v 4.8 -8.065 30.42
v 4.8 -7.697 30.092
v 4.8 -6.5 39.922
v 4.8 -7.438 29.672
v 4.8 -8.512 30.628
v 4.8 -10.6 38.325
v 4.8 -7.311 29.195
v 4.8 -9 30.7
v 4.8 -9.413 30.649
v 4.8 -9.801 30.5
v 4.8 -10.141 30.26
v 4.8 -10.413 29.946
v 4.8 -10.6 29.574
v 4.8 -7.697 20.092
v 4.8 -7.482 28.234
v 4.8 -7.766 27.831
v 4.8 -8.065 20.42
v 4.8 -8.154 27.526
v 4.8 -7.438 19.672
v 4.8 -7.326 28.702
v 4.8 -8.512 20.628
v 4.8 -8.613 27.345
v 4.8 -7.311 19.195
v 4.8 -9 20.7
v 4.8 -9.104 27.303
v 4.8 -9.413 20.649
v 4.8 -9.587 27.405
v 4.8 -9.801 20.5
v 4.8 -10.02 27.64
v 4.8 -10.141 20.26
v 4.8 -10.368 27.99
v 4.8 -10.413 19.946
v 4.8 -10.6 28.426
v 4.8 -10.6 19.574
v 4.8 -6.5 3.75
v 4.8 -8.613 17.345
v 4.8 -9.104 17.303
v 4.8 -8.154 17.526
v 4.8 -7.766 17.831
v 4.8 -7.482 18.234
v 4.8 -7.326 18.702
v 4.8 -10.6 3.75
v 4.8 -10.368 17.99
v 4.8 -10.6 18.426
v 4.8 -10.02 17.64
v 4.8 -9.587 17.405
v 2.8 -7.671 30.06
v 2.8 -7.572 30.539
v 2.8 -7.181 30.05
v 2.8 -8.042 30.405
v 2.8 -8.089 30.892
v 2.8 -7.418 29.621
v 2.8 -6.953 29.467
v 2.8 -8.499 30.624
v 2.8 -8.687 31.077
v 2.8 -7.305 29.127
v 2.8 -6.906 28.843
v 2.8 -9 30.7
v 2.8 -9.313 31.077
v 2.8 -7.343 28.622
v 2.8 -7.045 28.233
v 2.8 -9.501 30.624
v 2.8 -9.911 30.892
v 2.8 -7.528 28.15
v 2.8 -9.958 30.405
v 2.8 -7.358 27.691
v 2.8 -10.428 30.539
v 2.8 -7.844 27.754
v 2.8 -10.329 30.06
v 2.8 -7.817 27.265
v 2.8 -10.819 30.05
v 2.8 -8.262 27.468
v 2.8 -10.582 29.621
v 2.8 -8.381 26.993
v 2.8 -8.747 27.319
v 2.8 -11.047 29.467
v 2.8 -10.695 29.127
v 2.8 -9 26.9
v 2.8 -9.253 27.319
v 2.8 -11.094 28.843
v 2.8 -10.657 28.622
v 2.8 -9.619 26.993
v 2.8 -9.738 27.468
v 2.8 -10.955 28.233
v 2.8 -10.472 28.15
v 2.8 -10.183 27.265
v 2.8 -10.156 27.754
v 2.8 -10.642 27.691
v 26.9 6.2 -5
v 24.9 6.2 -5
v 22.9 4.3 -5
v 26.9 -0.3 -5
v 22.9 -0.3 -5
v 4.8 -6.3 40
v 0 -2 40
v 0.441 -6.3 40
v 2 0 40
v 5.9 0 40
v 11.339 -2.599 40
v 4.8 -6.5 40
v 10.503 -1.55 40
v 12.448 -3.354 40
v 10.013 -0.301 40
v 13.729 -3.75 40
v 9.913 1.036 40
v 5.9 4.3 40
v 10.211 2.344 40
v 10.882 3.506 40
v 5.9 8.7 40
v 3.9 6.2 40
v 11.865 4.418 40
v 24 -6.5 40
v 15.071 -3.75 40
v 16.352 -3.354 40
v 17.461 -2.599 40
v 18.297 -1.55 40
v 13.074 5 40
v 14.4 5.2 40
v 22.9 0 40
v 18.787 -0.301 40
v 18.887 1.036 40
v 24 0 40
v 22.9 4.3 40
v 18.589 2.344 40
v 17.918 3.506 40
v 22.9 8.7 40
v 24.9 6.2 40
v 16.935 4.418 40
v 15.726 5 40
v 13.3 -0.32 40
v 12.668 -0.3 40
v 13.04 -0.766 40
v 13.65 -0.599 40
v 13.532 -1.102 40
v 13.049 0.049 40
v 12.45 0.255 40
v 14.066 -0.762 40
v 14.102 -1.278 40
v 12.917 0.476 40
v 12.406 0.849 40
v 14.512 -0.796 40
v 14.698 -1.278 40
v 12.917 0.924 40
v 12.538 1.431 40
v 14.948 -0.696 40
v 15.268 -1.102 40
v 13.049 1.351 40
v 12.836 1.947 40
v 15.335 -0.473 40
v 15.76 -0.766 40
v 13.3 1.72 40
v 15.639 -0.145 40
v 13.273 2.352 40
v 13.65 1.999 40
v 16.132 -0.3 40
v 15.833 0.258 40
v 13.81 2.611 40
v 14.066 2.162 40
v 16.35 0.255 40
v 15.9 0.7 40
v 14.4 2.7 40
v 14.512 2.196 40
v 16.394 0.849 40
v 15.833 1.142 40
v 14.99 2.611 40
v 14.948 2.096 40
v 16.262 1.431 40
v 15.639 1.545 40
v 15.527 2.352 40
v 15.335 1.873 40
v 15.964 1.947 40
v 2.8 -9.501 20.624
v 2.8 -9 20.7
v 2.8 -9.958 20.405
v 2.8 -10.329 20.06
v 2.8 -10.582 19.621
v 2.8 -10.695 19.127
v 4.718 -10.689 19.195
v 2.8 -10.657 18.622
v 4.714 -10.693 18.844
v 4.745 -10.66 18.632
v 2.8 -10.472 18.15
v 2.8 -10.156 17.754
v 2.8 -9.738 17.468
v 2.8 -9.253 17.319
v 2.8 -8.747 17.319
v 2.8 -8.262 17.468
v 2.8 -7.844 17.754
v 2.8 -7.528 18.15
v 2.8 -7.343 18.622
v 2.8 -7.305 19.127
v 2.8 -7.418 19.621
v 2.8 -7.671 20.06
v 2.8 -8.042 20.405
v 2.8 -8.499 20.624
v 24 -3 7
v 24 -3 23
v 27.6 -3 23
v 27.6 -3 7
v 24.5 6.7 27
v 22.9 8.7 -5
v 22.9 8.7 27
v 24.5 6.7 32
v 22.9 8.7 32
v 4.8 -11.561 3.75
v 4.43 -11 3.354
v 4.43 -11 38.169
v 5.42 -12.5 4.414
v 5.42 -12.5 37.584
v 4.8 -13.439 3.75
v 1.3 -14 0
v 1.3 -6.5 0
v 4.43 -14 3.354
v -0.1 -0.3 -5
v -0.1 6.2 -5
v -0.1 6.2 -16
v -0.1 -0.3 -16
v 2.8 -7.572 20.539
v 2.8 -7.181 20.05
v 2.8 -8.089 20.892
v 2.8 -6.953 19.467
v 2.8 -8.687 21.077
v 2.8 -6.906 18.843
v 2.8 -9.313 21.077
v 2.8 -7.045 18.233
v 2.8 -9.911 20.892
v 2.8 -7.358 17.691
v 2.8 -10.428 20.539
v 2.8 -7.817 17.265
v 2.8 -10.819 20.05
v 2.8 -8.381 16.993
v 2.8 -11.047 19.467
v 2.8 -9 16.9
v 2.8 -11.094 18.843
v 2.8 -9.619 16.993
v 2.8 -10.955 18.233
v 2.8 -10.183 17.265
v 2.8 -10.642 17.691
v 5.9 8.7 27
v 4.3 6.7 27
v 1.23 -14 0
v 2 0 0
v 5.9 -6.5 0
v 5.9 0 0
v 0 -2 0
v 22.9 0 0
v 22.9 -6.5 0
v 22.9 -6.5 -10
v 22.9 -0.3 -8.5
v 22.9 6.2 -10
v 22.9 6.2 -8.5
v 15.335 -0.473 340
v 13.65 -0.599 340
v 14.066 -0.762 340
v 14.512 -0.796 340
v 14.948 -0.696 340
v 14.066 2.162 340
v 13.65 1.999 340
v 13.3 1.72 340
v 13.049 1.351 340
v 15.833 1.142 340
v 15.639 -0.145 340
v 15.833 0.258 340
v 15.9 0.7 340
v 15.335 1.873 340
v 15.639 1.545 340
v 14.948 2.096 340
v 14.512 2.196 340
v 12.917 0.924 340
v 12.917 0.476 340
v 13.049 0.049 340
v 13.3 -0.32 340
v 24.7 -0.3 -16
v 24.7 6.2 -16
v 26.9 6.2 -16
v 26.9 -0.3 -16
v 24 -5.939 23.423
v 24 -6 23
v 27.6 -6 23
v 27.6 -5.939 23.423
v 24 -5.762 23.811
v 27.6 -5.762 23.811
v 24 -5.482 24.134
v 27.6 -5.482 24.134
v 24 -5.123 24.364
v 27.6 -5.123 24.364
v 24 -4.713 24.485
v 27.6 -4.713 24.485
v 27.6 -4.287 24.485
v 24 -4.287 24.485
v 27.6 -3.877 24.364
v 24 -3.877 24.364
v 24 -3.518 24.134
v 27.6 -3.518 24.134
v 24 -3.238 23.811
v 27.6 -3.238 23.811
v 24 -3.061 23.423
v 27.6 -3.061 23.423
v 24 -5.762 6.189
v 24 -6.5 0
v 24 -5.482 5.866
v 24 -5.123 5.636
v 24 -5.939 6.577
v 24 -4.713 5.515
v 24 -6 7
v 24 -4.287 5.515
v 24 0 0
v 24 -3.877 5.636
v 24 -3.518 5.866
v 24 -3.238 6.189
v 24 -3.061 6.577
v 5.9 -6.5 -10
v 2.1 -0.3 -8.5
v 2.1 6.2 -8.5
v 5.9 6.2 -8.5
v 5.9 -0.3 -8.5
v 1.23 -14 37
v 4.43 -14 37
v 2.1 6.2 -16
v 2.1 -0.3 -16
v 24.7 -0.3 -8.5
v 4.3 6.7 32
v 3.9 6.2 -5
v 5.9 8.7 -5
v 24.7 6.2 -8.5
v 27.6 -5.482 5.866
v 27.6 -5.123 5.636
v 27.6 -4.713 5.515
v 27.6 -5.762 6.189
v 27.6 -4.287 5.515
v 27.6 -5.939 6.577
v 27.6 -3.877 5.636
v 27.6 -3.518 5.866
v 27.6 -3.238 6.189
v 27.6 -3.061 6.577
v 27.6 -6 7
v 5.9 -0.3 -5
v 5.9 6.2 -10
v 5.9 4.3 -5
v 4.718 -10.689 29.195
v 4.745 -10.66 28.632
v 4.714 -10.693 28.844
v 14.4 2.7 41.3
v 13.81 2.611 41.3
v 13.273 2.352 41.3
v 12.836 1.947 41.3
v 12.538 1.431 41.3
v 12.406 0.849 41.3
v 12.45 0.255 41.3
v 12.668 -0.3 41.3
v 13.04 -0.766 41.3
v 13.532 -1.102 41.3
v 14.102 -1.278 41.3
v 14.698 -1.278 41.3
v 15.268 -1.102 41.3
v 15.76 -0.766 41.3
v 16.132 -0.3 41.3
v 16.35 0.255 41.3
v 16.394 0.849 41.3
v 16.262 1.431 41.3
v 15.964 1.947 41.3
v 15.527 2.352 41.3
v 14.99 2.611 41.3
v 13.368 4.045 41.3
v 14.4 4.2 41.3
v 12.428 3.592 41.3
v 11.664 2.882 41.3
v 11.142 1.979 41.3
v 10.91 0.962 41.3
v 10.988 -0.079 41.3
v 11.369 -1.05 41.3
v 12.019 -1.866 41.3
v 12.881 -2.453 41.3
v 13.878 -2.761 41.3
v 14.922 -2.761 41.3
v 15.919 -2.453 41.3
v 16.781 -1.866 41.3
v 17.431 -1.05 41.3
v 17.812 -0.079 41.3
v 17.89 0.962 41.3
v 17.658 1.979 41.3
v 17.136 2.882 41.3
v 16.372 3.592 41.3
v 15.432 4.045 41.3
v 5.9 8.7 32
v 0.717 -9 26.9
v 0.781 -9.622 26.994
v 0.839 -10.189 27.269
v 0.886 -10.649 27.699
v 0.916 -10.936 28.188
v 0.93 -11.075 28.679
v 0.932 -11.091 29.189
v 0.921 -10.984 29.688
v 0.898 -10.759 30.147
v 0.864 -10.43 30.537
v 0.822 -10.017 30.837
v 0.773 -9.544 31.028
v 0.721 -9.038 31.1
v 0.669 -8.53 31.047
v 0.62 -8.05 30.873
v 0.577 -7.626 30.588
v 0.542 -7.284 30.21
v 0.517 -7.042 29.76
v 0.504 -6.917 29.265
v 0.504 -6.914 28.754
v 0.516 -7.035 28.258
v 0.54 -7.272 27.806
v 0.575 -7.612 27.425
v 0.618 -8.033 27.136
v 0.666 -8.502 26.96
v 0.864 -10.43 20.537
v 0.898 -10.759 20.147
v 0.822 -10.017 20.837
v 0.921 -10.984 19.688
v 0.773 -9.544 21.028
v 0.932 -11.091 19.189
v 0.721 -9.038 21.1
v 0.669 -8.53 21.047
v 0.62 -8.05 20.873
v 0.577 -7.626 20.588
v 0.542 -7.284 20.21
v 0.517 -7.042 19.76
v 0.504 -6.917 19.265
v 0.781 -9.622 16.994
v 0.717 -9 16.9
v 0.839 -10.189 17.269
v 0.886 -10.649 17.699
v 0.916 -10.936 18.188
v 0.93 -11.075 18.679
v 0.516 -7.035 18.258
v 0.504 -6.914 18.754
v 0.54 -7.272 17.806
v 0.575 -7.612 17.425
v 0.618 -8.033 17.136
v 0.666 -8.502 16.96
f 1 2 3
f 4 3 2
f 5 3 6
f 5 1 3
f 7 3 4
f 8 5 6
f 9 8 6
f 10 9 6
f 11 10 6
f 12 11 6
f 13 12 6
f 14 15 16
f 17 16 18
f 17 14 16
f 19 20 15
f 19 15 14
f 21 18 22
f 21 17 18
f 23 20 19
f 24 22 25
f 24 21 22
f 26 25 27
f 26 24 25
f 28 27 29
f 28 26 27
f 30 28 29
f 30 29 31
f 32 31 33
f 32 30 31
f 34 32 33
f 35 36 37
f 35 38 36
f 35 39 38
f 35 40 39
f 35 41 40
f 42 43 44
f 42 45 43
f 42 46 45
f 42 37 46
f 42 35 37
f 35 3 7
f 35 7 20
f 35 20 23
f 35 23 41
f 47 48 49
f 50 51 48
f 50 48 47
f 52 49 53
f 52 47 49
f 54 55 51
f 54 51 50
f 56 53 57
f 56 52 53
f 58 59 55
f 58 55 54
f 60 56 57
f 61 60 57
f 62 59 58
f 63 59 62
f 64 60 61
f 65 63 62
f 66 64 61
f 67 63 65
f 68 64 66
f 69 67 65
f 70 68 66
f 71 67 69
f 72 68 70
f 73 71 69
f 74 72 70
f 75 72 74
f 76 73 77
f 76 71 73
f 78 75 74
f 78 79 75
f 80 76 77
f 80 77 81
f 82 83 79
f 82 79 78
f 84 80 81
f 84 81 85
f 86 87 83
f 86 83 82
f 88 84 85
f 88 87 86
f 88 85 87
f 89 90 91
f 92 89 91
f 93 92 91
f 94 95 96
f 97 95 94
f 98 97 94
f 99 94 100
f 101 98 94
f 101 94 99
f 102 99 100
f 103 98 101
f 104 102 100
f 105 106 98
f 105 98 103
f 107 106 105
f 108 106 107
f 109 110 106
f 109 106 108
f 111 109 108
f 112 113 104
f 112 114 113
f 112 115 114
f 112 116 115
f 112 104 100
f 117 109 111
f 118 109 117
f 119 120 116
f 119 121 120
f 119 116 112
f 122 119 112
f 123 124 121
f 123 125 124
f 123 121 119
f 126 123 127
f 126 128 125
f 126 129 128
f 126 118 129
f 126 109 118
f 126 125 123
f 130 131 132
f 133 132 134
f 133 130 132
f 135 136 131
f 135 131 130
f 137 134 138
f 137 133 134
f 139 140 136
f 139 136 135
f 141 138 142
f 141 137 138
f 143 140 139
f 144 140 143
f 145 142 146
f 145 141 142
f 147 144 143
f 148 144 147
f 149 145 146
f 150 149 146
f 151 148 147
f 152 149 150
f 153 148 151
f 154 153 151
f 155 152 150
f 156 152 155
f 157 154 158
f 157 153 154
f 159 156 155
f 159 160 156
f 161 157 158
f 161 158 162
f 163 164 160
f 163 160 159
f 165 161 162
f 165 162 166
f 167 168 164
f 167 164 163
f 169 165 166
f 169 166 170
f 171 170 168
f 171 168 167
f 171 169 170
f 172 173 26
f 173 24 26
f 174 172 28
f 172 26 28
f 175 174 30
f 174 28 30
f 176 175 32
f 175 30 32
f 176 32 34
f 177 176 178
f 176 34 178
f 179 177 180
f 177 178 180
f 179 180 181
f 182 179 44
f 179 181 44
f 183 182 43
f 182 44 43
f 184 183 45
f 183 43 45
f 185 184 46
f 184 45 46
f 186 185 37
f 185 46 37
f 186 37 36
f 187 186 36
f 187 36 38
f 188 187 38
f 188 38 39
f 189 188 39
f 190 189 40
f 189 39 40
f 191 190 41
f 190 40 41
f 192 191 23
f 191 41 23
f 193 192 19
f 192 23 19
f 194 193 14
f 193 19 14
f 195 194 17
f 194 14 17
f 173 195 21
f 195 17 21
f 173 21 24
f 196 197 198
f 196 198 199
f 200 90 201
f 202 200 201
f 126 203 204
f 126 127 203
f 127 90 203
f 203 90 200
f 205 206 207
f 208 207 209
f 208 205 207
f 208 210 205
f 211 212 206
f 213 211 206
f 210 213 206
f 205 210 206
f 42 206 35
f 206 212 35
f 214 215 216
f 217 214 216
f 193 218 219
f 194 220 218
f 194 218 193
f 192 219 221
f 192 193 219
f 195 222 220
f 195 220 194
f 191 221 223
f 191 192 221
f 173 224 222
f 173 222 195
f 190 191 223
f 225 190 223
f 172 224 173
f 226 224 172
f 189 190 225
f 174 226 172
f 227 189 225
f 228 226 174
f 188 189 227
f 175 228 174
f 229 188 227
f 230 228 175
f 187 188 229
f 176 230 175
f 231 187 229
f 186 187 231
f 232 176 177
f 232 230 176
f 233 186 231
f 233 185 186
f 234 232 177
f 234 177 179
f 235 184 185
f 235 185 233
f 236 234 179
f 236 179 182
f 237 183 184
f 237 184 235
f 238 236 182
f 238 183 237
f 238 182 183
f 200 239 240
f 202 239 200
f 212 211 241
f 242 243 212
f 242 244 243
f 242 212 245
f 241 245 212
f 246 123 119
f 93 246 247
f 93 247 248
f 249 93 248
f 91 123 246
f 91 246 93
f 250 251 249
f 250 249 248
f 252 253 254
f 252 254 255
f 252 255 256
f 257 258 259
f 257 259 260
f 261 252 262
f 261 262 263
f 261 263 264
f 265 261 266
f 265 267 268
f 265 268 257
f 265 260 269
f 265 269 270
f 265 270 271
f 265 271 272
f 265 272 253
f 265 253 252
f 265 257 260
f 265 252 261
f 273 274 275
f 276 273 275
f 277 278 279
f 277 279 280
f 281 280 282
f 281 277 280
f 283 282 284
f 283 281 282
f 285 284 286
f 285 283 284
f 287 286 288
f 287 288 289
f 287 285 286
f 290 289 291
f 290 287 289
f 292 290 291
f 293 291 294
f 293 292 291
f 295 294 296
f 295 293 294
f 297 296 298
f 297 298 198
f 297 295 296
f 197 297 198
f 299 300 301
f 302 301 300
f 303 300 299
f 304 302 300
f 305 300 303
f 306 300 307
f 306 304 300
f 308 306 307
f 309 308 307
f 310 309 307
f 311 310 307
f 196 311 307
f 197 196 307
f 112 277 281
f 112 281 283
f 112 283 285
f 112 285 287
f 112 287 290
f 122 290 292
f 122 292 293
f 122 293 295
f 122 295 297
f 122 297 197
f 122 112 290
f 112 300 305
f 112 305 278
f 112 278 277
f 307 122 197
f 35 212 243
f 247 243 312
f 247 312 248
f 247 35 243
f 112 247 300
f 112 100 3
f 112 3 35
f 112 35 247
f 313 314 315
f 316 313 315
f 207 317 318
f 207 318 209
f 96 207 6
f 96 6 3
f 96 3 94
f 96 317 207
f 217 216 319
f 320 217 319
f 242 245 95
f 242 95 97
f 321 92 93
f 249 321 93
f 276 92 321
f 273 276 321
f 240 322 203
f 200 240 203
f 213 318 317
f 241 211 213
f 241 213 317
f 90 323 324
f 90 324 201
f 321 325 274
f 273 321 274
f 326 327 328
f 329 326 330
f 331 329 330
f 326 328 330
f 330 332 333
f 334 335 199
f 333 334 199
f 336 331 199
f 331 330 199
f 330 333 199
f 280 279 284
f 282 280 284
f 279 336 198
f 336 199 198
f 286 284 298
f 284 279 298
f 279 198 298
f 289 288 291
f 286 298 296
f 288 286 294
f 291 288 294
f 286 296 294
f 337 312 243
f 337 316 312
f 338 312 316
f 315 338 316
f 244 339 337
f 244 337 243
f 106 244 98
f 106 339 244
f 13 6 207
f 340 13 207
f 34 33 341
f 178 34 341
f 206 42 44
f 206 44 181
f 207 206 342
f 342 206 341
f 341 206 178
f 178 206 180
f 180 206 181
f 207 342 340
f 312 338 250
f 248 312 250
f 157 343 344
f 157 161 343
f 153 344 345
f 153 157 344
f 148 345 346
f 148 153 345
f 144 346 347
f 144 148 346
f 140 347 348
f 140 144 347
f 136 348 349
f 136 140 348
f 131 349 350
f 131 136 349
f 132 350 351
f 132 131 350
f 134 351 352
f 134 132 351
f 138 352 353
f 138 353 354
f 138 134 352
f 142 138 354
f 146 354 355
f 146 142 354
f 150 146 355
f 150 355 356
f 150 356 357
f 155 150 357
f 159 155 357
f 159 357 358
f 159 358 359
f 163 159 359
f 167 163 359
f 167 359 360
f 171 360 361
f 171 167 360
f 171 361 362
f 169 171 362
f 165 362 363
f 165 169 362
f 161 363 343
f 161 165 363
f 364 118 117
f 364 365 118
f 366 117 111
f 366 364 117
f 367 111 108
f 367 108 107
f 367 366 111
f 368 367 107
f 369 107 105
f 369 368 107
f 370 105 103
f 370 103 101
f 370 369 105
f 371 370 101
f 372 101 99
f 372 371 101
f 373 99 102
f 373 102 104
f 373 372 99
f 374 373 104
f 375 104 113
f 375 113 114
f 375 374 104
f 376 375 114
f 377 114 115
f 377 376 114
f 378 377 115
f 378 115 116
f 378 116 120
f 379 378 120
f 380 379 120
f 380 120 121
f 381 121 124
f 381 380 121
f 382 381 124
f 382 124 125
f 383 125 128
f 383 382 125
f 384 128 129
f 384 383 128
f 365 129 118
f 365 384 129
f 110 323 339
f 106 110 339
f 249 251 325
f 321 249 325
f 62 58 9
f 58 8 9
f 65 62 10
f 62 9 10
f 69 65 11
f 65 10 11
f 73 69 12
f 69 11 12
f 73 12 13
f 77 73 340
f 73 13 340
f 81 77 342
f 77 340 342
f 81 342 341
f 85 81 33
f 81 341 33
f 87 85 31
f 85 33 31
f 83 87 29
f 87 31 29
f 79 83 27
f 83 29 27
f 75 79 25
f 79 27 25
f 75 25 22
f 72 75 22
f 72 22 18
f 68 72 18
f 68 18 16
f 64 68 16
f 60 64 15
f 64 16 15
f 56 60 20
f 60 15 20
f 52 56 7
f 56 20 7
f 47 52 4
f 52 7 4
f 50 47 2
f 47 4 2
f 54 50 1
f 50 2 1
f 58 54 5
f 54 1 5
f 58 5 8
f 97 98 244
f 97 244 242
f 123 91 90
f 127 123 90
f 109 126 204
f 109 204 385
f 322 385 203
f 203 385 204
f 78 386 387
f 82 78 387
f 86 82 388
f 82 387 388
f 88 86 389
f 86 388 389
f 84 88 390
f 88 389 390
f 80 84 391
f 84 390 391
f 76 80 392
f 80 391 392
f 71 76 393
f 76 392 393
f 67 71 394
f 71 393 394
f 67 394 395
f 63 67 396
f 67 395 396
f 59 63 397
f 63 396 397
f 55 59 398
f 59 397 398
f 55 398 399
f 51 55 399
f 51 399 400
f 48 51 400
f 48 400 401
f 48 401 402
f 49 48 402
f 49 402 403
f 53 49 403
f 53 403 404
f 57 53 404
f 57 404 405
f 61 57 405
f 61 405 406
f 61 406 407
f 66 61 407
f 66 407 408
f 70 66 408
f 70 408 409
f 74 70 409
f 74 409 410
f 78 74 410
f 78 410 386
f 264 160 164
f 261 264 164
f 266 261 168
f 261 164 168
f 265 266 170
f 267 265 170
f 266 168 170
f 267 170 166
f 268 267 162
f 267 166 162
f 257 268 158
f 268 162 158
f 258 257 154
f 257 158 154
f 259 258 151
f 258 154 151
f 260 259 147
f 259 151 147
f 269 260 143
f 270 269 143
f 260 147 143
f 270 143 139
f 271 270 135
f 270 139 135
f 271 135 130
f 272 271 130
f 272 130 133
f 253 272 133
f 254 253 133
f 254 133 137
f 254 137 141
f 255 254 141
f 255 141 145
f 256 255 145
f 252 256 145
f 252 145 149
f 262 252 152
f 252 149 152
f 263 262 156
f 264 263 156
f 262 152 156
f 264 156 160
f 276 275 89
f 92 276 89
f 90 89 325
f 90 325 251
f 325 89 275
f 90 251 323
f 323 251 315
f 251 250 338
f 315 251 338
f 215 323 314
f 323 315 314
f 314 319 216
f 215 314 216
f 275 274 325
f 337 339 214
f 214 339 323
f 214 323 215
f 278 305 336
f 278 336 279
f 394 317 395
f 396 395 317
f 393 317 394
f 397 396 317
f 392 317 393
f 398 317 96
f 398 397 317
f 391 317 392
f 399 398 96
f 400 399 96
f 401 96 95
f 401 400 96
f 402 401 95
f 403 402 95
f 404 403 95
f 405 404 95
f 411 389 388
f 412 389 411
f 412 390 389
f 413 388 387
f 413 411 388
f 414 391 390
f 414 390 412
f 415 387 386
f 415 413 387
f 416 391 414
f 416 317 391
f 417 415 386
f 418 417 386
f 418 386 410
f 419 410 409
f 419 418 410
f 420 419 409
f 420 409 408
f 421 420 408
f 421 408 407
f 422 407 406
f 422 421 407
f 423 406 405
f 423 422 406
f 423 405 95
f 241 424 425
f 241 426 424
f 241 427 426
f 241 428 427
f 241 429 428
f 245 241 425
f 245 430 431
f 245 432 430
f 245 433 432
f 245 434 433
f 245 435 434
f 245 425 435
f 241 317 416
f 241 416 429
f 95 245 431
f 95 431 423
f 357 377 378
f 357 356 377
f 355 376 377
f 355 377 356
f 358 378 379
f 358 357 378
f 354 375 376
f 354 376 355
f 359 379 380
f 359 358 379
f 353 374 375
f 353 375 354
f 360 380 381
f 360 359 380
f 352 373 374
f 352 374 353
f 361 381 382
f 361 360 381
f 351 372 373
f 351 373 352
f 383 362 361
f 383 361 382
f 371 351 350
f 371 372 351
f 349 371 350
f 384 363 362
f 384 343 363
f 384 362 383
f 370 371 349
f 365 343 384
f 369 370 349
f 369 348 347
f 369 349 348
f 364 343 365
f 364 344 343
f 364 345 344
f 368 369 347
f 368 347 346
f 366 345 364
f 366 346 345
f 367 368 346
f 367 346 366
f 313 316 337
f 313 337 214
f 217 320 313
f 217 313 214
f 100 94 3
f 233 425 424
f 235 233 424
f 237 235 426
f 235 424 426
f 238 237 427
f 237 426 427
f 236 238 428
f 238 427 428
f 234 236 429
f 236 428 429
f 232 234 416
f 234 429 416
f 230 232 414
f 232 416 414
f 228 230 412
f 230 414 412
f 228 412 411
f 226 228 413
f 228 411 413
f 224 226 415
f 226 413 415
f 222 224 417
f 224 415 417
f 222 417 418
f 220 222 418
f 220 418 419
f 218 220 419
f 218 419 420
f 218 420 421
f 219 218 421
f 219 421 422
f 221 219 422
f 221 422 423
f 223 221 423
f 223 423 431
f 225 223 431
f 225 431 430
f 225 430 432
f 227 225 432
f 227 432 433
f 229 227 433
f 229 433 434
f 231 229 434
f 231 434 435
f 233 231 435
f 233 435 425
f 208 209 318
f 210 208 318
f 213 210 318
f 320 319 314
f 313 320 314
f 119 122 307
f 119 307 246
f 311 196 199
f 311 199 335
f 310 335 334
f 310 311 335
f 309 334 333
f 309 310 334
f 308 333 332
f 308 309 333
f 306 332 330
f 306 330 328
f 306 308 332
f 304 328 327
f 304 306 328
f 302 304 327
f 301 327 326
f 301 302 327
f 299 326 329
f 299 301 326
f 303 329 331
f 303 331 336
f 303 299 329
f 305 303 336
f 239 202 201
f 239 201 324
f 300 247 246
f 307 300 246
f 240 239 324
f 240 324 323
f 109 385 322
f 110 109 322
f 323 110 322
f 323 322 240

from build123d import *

# Parameters (mm, degrees)
BOSS_EXTRU_1_DEPTH                                 = 40
ENL_V_MAT_EXTRU_1_DEPTH                            = 43.650205158
ENL_V_MAT_EXTRU_1_DEPTH_BACK                       = 43.650205158
ENL_V_MAT_EXTRU_3_DEPTH                            = 40
CHAMBRAGE_POUR_VIS_T_TE_HEXAGONALE_M31_D           = 3.4
CHAMBRAGE_POUR_VIS_T_TE_HEXAGONALE_M31_CBORE_D     = 4.2
CHAMBRAGE_POUR_VIS_T_TE_HEXAGONALE_M31_CBORE_DEPTH = 3
ESQUISSE6_W                                        = 7.050171065
ESQUISSE6_H                                        = 7.359112957
ENL_V_MAT_EXTRU_4_DEPTH                            = 10
BOSS_EXTRU_2_DEPTH                                 = 50
ESQUISSE9_W                                        = 5
ESQUISSE9_H                                        = 2.5
ENL_V_MAT_EXTRU_5_DEPTH                            = 51.216531143
ESQUISSE11_W                                       = 2
ESQUISSE11_H                                       = 5
ESQUISSE11_W_2                                     = 2.243048
ENL_V_MAT_EXTRU_6_DEPTH                            = 10
ESQUISSE13_W                                       = 10
ESQUISSE13_H                                       = 6.5
ENL_V_MAT_EXTRU_7_DEPTH                            = 6.5
ESQUISSE14_W                                       = 10
ESQUISSE14_H                                       = 6.5
ENL_V_MAT_EXTRU_8_DEPTH                            = 6.5
BOSS_EXTRU_3_DEPTH                                 = 6.5
ESQUISSE15_W                                       = 21
ESQUISSE15_H                                       = 2
ENL_V_MAT_EXTRU_9_DEPTH                            = 5
BOSS_EXTRU_4_DEPTH                                 = 3.6
ESQUISSE17_R                                       = 1.5
BOSS_EXTRU_5_DEPTH                                 = 300


with BuildPart() as part:
    # Esquisse1 → Boss.-Extru.1 (new body)
    with BuildSketch(Plane.XY):
        Polygon((0, -2), (2, 0), (4.8, 0), (4.8, -10.6), (4.43, -11), (5.42, -12.5), (4.43, -14), (1.23, -14), align=None)
    extrude(amount=BOSS_EXTRU_1_DEPTH)

    # Esquisse2 → Enlèv. mat.-Extru.1 (cut, two sides: drawn at the far end of the back side and taken through both)
    with BuildSketch(Plane(origin=(4.8, 0, 0), x_dir=(0, 0, -1), z_dir=(1, 0, 0)).offset(-ENL_V_MAT_EXTRU_1_DEPTH_BACK)):
        Polygon((-37, -14), (-40, -6.3), (-40, -14), align=None)
    extrude(amount=ENL_V_MAT_EXTRU_1_DEPTH + ENL_V_MAT_EXTRU_1_DEPTH_BACK, mode=Mode.SUBTRACT)

    # Esquisse3 → Enlèv. mat.-Extru.3 (cut)
    with BuildSketch(Plane(origin=(0, -6.5, 0), x_dir=(-1, 0, 0), z_dir=(0, 1, 0))):
        Polygon((-5.706792822, 0), (-1.3, 0), (-4.8, 3.75), (-5.706792822, 3.75), align=None)
    extrude(amount=-ENL_V_MAT_EXTRU_3_DEPTH, mode=Mode.SUBTRACT)

    # Chambrage pour vis à tête hexagonale M31 (through all)
    with Locations(Plane(origin=(-0.2, 2.258699511, 74.572212386), x_dir=(0, 0, -1), z_dir=(-1, 0, 0))):
        with Locations((55.572212386, 11.258699511), (45.572212386, 11.258699511)):
            CounterBoreHole(CHAMBRAGE_POUR_VIS_T_TE_HEXAGONALE_M31_D / 2, CHAMBRAGE_POUR_VIS_T_TE_HEXAGONALE_M31_CBORE_D / 2, CHAMBRAGE_POUR_VIS_T_TE_HEXAGONALE_M31_CBORE_DEPTH)

    # Esquisse6 → Enlèv. mat.-Extru.4 (cut)
    with BuildSketch(Plane(origin=(0.694774347, 0, -0.648456057), x_dir=(-0.6823182503600115, 0, -0.7310552682428687), z_dir=(0.7310552682428687, 0, -0.6823182503600115))):
        with Locations((-6.596251813, -11.630248497)):
            Rectangle(ESQUISSE6_W, ESQUISSE6_H)
    extrude(amount=ENL_V_MAT_EXTRU_4_DEPTH, mode=Mode.SUBTRACT)

    # Esquisse7 → Boss.-Extru.2 (add)
    with BuildSketch(Plane.XY.offset(40)):
        Polygon((4.8, -6.5), (24, -6.5), (24, 0), (22.9, 0), (22.9, 4.3), (24.9, 6.2), (22.9, 8.7), (5.9, 8.7), (3.9, 6.2), (5.9, 4.3), (5.9, 0), (4.8, 0), align=None)
    extrude(amount=-BOSS_EXTRU_2_DEPTH)

    # Esquisse8 → Révolution1 (revolve)
    with BuildSketch(Plane(origin=(14.4, 0, 0), x_dir=(0, 0, -1), z_dir=(1, 0, 0))):
        Polygon((-40, 5.2), (-41.3, 4.2), (-41.3, 2.7), (-40, 2.7), align=None)
    revolve(axis=Axis((14.4, 0.7, 31.308149913), (0, 0, 1)))

    # Esquisse9 → Enlèv. mat.-Extru.5 (cut, through all)
    with BuildSketch(Plane(origin=(0, 0, 0), x_dir=(0, 0, -1), z_dir=(1, 0, 0))):
        with Locations((7.5, 7.45)):
            Rectangle(ESQUISSE9_W, ESQUISSE9_H)
    extrude(amount=ENL_V_MAT_EXTRU_5_DEPTH, mode=Mode.SUBTRACT)

    # Esquisse11 → Enlèv. mat.-Extru.6 (cut)
    with BuildSketch(Plane(origin=(0, 0, 0), x_dir=(1, 0, 0), z_dir=(0, 1, 0))):
        with Locations((23.9, 7.5)):
            Rectangle(ESQUISSE11_W, ESQUISSE11_H)
        with Locations((4.778476, 7.5)):
            Rectangle(ESQUISSE11_W_2, ESQUISSE11_H)
    extrude(amount=ENL_V_MAT_EXTRU_6_DEPTH, mode=Mode.SUBTRACT)

    # Esquisse13 → Enlèv. mat.-Extru.7 (cut)
    with BuildSketch(Plane.ZY.offset(-5.9)):
        with Locations((-5, -3.25)):
            Rectangle(ESQUISSE13_W, ESQUISSE13_H)
    extrude(amount=ENL_V_MAT_EXTRU_7_DEPTH, mode=Mode.SUBTRACT)

    # Esquisse14 → Enlèv. mat.-Extru.8 (cut)
    with BuildSketch(Plane(origin=(22.9, 0, 0), x_dir=(0, 0, -1), z_dir=(1, 0, 0))):
        with Locations((5, -3.25)):
            Rectangle(ESQUISSE14_W, ESQUISSE14_H)
    extrude(amount=ENL_V_MAT_EXTRU_8_DEPTH, mode=Mode.SUBTRACT)

    # Esquisse10 → Boss.-Extru.3 (add)
    with BuildSketch(Plane(origin=(0, 6.2, 0), x_dir=(1, 0, 0), z_dir=(0, 1, 0))):
        Polygon((26.9, 5), (-0.1, 5), (-0.1, 16), (2.1, 16), (2.1, 8.5), (24.7, 8.5), (24.7, 16), (26.9, 16), align=None)
    extrude(amount=-BOSS_EXTRU_3_DEPTH)

    # Esquisse15 → Enlèv. mat.-Extru.9 (cut)
    with BuildSketch(Plane.XY.offset(32)):
        with Locations((14.4, 7.7)):
            Rectangle(ESQUISSE15_W, ESQUISSE15_H)
    extrude(amount=-ENL_V_MAT_EXTRU_9_DEPTH, mode=Mode.SUBTRACT)

    # Esquisse16 → Boss.-Extru.4 (add)
    with BuildSketch(Plane(origin=(24, 0, 0), x_dir=(0, 0, -1), z_dir=(1, 0, 0))):
        with BuildLine():
            Line((-7, -6), (-23, -6))
            ThreePointArc((-23, -6), (-24.5, -4.5), (-23, -3))
            Line((-23, -3), (-7, -3))
            ThreePointArc((-7, -3), (-5.5, -4.5), (-7, -6))
        make_face()
    extrude(amount=BOSS_EXTRU_4_DEPTH)

    # Esquisse17 → Boss.-Extru.5 (add)
    with BuildSketch(Plane.XY.offset(40)):
        with Locations((14.4, 0.7)):
            Circle(ESQUISSE17_R)
    extrude(amount=BOSS_EXTRU_5_DEPTH)


solid = part.part
